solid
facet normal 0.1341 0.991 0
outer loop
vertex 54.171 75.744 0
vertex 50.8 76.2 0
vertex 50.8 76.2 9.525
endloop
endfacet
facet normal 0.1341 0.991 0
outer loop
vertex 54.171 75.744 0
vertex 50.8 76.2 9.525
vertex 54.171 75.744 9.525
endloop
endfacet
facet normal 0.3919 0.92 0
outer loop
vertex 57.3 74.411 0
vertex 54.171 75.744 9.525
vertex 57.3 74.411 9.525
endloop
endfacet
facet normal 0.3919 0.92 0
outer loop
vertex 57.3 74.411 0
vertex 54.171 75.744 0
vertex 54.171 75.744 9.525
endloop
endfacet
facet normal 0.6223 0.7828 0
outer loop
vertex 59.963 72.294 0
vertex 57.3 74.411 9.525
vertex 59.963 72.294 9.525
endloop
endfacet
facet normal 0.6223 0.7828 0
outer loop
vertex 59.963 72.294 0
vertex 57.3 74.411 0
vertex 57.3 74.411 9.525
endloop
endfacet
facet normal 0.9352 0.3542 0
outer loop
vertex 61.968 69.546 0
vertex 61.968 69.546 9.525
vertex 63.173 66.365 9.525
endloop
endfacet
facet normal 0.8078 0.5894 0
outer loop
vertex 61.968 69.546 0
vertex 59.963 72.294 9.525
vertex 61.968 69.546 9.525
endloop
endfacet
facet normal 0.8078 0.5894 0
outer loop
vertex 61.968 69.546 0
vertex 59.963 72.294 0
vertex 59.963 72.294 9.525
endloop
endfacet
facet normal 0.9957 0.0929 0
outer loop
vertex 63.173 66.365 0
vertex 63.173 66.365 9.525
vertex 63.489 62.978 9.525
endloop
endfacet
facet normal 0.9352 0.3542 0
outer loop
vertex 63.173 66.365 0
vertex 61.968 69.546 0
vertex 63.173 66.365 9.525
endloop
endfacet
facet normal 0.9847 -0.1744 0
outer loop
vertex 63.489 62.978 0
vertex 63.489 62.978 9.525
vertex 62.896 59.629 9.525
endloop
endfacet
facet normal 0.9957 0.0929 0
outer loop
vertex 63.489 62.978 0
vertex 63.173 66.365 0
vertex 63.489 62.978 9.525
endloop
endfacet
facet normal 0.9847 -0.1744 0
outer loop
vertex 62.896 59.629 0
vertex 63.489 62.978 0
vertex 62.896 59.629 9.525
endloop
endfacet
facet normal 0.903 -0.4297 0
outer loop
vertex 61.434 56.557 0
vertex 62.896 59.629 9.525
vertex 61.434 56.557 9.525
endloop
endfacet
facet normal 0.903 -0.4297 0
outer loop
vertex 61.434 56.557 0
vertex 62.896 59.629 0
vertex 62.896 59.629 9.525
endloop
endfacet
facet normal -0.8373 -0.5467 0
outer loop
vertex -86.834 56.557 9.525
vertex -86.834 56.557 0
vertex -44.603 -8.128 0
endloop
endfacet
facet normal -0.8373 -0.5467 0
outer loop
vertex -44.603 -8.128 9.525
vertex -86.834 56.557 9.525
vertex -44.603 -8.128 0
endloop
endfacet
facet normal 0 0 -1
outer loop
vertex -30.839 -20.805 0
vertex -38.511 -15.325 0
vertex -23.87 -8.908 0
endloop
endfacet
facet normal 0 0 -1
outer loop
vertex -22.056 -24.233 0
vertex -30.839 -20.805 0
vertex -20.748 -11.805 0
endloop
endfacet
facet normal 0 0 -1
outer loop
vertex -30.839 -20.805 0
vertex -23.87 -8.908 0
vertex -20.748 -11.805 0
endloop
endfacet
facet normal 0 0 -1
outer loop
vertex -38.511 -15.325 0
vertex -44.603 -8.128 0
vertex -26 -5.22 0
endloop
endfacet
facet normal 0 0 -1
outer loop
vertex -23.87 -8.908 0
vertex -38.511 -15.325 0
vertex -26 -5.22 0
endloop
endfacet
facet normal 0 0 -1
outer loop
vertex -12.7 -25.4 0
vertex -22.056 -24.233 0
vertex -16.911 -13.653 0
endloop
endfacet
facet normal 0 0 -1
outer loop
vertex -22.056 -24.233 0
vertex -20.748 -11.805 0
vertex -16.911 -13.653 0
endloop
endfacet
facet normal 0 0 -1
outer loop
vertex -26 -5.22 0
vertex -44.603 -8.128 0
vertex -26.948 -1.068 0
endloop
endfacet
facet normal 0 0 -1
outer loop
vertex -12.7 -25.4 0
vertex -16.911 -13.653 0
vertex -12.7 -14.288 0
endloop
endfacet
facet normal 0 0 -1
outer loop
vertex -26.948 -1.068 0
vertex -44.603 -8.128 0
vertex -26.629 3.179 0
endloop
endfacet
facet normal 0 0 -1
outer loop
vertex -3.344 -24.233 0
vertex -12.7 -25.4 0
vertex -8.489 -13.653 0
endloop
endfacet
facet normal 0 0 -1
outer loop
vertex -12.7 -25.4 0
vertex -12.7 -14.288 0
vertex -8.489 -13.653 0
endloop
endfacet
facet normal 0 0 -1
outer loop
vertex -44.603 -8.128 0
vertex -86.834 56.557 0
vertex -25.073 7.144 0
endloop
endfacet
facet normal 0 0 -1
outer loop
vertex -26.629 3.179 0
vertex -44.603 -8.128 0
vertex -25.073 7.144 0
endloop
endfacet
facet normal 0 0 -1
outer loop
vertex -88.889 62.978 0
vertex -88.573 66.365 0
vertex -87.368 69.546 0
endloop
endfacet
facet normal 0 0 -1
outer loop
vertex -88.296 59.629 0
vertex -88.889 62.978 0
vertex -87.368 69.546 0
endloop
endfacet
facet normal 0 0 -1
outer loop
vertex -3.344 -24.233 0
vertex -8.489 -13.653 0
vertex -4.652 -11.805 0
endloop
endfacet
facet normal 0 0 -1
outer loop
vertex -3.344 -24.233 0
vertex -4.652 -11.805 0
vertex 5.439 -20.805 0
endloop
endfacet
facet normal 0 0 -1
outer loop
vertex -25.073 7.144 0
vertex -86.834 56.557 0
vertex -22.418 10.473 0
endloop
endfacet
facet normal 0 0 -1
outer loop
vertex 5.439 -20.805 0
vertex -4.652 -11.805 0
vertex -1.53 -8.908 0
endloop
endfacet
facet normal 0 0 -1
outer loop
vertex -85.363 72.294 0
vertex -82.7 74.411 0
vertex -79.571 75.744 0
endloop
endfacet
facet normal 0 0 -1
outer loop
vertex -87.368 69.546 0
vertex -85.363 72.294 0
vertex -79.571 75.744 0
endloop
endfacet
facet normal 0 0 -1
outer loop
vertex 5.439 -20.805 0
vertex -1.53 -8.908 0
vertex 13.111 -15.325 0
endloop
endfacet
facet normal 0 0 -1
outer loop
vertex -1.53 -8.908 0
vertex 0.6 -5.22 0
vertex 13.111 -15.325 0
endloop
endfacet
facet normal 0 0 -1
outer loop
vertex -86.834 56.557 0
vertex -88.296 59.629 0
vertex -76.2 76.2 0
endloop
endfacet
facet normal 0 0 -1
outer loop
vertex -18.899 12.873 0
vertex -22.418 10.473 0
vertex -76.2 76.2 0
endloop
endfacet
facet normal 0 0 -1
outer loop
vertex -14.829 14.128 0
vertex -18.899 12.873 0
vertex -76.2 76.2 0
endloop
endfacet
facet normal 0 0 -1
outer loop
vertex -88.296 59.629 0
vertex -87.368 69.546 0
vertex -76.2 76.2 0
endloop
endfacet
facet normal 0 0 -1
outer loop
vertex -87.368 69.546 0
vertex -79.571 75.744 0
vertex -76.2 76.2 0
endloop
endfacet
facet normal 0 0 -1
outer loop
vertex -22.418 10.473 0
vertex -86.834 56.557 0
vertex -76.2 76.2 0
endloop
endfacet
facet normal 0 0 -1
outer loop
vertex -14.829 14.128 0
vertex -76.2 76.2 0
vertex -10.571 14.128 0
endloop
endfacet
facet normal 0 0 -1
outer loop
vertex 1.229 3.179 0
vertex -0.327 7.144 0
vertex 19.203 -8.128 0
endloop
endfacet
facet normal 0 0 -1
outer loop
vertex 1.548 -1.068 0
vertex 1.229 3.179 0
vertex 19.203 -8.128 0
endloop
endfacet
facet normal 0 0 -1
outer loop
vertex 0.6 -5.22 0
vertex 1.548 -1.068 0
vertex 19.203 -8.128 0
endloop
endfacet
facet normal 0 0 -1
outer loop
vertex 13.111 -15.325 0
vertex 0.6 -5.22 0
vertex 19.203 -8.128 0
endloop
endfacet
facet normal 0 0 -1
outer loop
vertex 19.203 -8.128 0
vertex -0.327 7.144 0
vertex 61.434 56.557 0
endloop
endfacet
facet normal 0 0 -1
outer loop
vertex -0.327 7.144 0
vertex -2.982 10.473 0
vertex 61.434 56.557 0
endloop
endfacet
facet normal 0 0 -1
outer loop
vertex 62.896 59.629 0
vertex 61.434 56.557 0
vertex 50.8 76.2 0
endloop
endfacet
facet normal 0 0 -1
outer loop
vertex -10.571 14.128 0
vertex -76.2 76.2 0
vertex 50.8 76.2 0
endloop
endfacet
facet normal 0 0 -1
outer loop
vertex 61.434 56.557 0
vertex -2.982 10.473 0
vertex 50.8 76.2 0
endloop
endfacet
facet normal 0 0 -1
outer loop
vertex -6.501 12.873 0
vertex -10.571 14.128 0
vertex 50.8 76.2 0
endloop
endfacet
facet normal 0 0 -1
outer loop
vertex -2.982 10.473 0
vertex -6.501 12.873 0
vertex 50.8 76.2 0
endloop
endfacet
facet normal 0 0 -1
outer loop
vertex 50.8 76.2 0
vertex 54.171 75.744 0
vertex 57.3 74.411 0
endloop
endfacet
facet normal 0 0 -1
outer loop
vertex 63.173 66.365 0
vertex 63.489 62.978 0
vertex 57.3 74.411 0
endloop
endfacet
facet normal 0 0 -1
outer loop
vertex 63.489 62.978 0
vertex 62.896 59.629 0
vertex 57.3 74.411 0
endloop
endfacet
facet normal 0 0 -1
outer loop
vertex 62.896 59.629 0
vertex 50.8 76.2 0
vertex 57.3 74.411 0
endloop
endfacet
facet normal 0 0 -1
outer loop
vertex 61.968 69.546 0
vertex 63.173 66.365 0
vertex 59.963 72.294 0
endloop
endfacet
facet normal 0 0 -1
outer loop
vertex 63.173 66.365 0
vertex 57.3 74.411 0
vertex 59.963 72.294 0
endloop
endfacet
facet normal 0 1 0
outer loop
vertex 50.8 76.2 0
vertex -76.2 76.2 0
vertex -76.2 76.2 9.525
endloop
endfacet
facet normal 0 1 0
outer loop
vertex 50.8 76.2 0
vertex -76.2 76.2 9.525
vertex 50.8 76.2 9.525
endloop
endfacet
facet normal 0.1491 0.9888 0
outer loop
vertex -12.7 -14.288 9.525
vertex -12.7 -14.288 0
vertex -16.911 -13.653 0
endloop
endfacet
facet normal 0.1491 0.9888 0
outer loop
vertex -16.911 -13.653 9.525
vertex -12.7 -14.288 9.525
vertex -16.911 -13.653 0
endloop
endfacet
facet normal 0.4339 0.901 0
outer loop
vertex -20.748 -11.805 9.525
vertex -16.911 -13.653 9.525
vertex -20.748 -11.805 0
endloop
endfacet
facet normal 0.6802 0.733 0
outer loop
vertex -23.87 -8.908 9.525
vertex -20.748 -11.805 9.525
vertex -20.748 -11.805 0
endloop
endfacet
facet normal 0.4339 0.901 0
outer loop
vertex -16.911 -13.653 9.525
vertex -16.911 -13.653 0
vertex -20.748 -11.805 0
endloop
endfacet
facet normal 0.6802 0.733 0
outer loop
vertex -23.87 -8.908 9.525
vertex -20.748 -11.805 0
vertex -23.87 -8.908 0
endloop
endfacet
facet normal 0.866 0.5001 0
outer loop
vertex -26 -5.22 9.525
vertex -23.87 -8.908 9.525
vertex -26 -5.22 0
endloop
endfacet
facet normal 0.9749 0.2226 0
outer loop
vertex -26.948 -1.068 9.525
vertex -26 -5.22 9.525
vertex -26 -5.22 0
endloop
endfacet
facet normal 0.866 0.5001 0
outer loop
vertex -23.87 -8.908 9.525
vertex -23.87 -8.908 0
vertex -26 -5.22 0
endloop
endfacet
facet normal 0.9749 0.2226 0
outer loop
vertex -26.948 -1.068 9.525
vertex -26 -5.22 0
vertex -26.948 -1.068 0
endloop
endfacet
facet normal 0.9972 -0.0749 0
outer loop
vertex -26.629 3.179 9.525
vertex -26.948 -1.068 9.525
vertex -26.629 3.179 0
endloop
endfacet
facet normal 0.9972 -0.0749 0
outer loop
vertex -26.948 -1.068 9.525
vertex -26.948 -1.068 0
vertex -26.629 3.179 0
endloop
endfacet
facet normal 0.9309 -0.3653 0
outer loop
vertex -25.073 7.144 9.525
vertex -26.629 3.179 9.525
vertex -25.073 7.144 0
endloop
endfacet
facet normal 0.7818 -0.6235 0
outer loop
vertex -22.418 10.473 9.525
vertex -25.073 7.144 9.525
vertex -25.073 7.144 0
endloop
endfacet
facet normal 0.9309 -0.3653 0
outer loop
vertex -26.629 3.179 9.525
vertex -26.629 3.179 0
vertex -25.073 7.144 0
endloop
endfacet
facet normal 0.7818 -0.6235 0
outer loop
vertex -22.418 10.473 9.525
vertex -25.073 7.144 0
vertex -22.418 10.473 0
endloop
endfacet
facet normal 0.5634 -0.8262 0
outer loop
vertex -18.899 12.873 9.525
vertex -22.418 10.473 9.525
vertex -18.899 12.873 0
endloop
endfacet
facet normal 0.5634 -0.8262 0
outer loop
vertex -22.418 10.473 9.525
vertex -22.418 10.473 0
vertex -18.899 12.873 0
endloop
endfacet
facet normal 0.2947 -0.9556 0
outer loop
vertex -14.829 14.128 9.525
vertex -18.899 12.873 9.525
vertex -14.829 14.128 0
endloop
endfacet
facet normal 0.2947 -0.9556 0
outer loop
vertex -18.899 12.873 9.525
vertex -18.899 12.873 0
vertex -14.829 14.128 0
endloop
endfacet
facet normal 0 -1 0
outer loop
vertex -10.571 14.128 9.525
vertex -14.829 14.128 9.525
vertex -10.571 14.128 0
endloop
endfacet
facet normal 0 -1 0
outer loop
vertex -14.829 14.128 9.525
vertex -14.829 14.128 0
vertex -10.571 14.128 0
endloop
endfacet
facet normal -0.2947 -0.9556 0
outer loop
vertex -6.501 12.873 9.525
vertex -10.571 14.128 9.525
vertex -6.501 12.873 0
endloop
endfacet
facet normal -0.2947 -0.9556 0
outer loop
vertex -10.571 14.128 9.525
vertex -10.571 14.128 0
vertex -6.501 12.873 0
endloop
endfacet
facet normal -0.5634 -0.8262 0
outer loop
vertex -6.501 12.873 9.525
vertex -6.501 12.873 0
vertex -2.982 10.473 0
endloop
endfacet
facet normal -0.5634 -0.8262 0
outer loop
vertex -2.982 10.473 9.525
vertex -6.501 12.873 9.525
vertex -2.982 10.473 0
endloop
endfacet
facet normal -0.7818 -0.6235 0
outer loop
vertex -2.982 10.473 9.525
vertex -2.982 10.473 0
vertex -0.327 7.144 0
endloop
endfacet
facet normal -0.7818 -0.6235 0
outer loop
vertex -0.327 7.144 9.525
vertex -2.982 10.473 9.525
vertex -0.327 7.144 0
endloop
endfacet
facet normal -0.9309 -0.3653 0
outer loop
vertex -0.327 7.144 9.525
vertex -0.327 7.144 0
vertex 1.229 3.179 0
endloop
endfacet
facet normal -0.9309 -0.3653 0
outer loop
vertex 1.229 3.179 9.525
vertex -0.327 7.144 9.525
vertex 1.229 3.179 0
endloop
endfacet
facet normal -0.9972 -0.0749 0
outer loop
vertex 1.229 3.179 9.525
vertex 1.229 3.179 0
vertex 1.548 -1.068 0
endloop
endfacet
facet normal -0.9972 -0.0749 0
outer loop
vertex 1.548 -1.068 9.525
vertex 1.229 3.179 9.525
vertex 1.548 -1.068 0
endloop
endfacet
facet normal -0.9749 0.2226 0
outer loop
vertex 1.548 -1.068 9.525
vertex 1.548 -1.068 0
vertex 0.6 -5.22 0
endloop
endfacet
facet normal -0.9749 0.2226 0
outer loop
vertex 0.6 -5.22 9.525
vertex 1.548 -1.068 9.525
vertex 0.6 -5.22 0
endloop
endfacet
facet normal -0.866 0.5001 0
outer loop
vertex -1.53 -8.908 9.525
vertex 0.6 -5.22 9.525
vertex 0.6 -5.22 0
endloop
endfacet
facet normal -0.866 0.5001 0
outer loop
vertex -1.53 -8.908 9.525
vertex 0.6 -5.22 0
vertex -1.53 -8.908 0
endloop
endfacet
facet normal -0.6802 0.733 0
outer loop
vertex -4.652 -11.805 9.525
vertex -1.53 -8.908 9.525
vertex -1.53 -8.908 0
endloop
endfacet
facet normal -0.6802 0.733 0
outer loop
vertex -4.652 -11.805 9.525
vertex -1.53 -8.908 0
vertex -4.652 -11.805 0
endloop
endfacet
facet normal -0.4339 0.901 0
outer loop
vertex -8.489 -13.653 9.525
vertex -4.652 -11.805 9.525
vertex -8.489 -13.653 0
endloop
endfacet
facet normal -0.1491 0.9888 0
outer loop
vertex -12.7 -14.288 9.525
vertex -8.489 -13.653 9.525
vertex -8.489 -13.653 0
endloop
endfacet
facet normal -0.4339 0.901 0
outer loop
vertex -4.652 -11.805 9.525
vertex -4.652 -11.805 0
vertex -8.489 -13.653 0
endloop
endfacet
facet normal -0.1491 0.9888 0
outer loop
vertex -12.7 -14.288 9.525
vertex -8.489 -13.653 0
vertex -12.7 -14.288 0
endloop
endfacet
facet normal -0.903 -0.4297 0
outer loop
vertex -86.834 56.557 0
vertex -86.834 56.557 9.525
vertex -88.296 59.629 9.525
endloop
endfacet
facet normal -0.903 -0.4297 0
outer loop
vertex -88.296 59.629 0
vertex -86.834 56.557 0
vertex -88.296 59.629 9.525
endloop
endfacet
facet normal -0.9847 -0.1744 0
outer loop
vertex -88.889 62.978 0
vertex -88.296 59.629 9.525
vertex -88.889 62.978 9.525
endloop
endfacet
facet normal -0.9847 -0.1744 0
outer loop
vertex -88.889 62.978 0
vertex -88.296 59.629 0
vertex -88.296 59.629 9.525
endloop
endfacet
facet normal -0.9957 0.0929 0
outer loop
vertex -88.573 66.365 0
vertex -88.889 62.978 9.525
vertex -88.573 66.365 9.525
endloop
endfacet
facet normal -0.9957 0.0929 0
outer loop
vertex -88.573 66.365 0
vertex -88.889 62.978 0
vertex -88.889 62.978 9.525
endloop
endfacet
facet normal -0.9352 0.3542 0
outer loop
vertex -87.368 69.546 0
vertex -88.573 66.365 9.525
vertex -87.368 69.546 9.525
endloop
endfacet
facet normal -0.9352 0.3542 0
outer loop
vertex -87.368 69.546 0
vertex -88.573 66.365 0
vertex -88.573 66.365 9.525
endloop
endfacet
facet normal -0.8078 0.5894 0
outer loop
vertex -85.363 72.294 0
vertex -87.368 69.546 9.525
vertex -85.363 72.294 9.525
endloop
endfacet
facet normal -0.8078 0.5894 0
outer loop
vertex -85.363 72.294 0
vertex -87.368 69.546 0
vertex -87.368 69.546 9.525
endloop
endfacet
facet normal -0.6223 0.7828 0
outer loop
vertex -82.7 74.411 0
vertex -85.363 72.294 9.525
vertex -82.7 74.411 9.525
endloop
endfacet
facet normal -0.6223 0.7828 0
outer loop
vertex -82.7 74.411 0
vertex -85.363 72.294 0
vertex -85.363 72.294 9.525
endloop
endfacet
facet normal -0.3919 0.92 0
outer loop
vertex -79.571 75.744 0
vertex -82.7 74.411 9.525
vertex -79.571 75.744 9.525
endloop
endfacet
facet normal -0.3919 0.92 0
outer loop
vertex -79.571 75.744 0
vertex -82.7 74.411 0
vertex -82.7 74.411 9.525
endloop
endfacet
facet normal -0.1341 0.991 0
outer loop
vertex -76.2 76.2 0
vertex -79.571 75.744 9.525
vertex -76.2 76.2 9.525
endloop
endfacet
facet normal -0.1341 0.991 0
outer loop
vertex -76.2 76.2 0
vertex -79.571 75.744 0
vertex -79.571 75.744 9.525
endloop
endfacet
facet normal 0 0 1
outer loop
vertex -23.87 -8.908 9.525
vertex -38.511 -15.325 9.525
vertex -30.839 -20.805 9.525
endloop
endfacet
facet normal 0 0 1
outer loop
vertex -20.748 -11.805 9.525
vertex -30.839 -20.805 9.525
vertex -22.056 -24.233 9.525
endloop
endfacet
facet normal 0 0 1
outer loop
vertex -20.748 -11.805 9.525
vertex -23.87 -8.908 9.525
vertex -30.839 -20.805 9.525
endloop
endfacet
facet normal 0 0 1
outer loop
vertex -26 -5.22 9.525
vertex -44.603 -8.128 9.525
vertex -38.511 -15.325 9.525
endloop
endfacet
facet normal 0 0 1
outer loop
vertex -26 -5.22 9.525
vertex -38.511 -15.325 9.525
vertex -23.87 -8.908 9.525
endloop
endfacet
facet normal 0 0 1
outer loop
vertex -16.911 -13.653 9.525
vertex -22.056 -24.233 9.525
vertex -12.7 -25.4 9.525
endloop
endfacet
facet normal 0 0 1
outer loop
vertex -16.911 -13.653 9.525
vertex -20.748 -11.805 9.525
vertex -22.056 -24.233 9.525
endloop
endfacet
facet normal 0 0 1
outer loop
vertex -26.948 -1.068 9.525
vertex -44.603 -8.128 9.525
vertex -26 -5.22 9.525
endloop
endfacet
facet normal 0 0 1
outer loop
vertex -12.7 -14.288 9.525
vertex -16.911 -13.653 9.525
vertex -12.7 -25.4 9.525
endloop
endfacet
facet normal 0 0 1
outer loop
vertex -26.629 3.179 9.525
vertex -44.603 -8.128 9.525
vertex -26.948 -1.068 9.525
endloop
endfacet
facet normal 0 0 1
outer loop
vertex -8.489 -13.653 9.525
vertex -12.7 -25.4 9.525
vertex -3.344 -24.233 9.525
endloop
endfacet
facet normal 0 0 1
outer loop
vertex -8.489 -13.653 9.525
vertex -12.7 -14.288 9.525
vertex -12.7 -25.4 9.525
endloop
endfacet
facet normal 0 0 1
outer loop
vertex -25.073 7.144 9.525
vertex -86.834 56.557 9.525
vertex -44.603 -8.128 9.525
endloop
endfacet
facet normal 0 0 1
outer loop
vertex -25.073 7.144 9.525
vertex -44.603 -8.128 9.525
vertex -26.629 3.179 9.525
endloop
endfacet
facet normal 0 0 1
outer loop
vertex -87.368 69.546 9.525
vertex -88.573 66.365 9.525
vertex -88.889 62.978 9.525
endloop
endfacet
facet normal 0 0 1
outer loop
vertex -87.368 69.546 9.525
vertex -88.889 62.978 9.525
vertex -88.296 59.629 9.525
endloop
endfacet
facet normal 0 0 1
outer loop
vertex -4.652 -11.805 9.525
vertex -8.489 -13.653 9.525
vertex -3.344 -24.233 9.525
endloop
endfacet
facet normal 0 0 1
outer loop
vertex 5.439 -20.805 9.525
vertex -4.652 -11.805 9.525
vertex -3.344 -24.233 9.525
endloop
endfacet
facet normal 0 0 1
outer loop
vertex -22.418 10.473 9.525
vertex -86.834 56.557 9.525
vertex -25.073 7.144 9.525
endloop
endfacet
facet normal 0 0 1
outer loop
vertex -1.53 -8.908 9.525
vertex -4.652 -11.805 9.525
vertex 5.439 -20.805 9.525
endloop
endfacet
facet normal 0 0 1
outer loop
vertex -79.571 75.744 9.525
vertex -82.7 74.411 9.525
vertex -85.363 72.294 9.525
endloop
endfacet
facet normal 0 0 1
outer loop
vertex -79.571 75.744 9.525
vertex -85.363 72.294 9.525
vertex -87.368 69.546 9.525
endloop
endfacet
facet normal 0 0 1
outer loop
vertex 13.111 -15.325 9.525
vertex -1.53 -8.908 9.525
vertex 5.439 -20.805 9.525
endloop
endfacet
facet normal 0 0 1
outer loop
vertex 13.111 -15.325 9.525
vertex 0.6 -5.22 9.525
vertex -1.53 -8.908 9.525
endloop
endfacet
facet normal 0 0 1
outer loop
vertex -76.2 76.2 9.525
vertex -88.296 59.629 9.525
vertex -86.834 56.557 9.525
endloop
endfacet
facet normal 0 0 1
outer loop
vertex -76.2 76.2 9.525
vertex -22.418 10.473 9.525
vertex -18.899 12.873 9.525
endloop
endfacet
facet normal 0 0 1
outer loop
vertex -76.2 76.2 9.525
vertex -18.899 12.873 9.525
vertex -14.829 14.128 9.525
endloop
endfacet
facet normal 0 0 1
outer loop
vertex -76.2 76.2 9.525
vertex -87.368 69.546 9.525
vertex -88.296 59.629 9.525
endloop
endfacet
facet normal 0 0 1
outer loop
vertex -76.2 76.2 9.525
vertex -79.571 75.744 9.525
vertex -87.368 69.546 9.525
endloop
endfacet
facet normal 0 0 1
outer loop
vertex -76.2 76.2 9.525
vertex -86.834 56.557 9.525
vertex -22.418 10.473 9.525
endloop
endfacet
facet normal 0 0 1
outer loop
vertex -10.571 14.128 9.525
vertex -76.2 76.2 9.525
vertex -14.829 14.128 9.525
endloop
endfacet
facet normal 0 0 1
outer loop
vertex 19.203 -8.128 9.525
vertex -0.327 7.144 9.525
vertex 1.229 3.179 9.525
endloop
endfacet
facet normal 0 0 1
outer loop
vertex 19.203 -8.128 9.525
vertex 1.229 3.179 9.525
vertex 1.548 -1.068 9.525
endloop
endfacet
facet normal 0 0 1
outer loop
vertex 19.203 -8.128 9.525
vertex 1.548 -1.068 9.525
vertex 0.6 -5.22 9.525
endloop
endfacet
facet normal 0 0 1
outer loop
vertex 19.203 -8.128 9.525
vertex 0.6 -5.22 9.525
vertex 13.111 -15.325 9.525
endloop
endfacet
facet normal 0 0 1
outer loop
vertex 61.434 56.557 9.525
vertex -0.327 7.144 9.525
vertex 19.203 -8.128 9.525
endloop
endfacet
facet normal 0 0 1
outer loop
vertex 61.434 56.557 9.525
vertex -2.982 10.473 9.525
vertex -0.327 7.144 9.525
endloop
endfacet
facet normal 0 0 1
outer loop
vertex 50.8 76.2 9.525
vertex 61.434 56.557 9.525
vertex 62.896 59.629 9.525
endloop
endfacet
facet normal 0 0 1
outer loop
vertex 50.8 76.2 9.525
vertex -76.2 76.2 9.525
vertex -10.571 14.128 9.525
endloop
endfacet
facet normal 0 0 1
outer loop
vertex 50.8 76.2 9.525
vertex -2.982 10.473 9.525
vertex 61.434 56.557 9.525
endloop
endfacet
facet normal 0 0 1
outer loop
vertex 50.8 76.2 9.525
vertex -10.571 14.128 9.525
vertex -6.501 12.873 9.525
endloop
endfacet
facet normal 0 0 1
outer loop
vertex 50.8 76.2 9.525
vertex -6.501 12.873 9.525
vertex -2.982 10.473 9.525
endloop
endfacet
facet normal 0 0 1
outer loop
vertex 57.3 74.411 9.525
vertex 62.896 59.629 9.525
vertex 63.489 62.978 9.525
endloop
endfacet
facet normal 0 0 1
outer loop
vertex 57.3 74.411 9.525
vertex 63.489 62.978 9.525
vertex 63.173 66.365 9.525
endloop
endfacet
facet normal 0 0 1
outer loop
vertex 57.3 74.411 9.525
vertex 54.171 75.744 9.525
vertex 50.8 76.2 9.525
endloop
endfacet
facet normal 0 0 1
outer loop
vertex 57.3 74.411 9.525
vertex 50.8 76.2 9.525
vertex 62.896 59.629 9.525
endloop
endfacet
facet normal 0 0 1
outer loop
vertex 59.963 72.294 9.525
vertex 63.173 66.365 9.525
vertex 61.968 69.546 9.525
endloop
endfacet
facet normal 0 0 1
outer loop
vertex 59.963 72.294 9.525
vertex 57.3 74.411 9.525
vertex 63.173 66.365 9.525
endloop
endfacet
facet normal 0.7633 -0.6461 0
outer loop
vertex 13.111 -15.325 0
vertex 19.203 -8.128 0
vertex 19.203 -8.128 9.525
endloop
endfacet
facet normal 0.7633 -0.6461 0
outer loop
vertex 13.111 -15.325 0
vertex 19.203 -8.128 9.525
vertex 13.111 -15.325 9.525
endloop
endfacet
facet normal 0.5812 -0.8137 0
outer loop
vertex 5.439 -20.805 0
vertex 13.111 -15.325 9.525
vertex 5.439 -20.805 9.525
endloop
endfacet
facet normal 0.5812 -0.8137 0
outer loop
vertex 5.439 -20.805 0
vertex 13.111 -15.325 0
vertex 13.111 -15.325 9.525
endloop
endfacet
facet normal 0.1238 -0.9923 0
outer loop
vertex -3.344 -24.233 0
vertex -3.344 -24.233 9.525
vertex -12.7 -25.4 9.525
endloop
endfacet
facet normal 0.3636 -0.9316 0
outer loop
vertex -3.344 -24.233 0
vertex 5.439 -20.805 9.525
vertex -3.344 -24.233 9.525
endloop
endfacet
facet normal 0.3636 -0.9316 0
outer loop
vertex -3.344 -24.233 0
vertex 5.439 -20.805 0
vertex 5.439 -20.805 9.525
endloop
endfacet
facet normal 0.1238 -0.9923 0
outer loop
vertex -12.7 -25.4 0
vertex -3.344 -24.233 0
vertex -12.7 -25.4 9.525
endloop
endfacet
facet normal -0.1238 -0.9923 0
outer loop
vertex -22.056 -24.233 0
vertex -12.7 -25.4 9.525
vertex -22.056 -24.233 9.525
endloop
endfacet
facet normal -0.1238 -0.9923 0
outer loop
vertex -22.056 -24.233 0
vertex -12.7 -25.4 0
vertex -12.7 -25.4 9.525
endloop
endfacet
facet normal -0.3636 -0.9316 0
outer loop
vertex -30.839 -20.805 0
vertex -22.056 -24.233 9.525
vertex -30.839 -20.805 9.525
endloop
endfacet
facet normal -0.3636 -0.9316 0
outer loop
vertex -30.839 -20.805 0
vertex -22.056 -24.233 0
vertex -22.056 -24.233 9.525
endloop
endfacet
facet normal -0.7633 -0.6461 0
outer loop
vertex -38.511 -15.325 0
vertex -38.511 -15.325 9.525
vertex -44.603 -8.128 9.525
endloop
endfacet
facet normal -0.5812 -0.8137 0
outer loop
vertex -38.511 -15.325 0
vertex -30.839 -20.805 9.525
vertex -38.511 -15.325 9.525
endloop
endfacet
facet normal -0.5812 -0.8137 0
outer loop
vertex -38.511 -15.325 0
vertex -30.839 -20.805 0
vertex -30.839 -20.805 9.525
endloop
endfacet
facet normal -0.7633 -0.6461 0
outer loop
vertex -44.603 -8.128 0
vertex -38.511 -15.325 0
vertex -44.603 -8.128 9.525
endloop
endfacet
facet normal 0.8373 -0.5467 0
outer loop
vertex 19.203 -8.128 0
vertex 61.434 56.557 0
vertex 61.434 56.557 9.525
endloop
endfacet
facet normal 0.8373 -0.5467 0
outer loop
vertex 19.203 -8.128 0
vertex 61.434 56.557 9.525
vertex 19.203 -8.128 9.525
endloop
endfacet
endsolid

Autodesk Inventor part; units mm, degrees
ref_plane "YZ Plane" through (0, 0, 0) normal (1, 0, 0) x (0, 1, 0)
ref_plane "XZ Plane" through (0, 0, 0) normal (0, 1, 0) x (-1, 0, 0)
ref_plane "XY Plane" through (0, 0, 0) normal (0, 0, 1) x (1, 0, 0)
sketch "Sketch1" plane through (0, 0, 0) normal (0, 0, 1) x (1, 0, 0)
  circle A0 centre (-12.7, 12.7) radius 38.1
  line L0 (-12.7, 12.7) -> (-12.7, 63.5)
  line L1 (-12.7, 63.5) -> (50.8, 63.5)
  line L2 (-12.7, 63.5) -> (-76.2, 63.5)
  circle A1 centre (-76.2, 63.5) radius 12.7
  circle A2 centre (50.8, 63.5) radius 12.7
  line L3 (-76.2, 76.2) -> (50.8, 76.2)
  line L4 (-86.8343, 56.5572) -> (-44.6028, -8.1284)
  line L5 (61.4343, 56.5572) -> (19.2028, -8.1284)
  point P0 (0, 0)
  dimension "d1" = 76.2
  dimension "d2" = 50.8
  dimension "d3" = 63.5
  dimension "d4" = 63.5
  dimension "d5" = 25.4
  dimension "d6" = 25.4
extrude "Extrusion2" add sketch "Sketch1" along normal blind 9.525
sketch "Sketch3" plane through (0, 0, 9.525) normal (0, 0, 1) x (1, 0, 0)
  line L0 (50.8, 76.2) -> (-76.2, 76.2) construction
  line L1 (-12.7, 76.2) -> (-12.7, -25.4) construction
  arc A0 (-44.6028, -8.1284) -> (19.2028, -8.1284) centre (-12.7, 12.7) ccw construction
  point P0 (0, 0)
  point P1 (-12.7, 0)
  dimension "d40" = 25.4
hole "Hole4" at (-12.7, 0, 9.525) direction (0, 0, -1) diameter 28.575 depth 25.4 tip angle 118
equation "\"d3\" = d4"
properties part number "bearingplaterear" material "Steel, Mild"
